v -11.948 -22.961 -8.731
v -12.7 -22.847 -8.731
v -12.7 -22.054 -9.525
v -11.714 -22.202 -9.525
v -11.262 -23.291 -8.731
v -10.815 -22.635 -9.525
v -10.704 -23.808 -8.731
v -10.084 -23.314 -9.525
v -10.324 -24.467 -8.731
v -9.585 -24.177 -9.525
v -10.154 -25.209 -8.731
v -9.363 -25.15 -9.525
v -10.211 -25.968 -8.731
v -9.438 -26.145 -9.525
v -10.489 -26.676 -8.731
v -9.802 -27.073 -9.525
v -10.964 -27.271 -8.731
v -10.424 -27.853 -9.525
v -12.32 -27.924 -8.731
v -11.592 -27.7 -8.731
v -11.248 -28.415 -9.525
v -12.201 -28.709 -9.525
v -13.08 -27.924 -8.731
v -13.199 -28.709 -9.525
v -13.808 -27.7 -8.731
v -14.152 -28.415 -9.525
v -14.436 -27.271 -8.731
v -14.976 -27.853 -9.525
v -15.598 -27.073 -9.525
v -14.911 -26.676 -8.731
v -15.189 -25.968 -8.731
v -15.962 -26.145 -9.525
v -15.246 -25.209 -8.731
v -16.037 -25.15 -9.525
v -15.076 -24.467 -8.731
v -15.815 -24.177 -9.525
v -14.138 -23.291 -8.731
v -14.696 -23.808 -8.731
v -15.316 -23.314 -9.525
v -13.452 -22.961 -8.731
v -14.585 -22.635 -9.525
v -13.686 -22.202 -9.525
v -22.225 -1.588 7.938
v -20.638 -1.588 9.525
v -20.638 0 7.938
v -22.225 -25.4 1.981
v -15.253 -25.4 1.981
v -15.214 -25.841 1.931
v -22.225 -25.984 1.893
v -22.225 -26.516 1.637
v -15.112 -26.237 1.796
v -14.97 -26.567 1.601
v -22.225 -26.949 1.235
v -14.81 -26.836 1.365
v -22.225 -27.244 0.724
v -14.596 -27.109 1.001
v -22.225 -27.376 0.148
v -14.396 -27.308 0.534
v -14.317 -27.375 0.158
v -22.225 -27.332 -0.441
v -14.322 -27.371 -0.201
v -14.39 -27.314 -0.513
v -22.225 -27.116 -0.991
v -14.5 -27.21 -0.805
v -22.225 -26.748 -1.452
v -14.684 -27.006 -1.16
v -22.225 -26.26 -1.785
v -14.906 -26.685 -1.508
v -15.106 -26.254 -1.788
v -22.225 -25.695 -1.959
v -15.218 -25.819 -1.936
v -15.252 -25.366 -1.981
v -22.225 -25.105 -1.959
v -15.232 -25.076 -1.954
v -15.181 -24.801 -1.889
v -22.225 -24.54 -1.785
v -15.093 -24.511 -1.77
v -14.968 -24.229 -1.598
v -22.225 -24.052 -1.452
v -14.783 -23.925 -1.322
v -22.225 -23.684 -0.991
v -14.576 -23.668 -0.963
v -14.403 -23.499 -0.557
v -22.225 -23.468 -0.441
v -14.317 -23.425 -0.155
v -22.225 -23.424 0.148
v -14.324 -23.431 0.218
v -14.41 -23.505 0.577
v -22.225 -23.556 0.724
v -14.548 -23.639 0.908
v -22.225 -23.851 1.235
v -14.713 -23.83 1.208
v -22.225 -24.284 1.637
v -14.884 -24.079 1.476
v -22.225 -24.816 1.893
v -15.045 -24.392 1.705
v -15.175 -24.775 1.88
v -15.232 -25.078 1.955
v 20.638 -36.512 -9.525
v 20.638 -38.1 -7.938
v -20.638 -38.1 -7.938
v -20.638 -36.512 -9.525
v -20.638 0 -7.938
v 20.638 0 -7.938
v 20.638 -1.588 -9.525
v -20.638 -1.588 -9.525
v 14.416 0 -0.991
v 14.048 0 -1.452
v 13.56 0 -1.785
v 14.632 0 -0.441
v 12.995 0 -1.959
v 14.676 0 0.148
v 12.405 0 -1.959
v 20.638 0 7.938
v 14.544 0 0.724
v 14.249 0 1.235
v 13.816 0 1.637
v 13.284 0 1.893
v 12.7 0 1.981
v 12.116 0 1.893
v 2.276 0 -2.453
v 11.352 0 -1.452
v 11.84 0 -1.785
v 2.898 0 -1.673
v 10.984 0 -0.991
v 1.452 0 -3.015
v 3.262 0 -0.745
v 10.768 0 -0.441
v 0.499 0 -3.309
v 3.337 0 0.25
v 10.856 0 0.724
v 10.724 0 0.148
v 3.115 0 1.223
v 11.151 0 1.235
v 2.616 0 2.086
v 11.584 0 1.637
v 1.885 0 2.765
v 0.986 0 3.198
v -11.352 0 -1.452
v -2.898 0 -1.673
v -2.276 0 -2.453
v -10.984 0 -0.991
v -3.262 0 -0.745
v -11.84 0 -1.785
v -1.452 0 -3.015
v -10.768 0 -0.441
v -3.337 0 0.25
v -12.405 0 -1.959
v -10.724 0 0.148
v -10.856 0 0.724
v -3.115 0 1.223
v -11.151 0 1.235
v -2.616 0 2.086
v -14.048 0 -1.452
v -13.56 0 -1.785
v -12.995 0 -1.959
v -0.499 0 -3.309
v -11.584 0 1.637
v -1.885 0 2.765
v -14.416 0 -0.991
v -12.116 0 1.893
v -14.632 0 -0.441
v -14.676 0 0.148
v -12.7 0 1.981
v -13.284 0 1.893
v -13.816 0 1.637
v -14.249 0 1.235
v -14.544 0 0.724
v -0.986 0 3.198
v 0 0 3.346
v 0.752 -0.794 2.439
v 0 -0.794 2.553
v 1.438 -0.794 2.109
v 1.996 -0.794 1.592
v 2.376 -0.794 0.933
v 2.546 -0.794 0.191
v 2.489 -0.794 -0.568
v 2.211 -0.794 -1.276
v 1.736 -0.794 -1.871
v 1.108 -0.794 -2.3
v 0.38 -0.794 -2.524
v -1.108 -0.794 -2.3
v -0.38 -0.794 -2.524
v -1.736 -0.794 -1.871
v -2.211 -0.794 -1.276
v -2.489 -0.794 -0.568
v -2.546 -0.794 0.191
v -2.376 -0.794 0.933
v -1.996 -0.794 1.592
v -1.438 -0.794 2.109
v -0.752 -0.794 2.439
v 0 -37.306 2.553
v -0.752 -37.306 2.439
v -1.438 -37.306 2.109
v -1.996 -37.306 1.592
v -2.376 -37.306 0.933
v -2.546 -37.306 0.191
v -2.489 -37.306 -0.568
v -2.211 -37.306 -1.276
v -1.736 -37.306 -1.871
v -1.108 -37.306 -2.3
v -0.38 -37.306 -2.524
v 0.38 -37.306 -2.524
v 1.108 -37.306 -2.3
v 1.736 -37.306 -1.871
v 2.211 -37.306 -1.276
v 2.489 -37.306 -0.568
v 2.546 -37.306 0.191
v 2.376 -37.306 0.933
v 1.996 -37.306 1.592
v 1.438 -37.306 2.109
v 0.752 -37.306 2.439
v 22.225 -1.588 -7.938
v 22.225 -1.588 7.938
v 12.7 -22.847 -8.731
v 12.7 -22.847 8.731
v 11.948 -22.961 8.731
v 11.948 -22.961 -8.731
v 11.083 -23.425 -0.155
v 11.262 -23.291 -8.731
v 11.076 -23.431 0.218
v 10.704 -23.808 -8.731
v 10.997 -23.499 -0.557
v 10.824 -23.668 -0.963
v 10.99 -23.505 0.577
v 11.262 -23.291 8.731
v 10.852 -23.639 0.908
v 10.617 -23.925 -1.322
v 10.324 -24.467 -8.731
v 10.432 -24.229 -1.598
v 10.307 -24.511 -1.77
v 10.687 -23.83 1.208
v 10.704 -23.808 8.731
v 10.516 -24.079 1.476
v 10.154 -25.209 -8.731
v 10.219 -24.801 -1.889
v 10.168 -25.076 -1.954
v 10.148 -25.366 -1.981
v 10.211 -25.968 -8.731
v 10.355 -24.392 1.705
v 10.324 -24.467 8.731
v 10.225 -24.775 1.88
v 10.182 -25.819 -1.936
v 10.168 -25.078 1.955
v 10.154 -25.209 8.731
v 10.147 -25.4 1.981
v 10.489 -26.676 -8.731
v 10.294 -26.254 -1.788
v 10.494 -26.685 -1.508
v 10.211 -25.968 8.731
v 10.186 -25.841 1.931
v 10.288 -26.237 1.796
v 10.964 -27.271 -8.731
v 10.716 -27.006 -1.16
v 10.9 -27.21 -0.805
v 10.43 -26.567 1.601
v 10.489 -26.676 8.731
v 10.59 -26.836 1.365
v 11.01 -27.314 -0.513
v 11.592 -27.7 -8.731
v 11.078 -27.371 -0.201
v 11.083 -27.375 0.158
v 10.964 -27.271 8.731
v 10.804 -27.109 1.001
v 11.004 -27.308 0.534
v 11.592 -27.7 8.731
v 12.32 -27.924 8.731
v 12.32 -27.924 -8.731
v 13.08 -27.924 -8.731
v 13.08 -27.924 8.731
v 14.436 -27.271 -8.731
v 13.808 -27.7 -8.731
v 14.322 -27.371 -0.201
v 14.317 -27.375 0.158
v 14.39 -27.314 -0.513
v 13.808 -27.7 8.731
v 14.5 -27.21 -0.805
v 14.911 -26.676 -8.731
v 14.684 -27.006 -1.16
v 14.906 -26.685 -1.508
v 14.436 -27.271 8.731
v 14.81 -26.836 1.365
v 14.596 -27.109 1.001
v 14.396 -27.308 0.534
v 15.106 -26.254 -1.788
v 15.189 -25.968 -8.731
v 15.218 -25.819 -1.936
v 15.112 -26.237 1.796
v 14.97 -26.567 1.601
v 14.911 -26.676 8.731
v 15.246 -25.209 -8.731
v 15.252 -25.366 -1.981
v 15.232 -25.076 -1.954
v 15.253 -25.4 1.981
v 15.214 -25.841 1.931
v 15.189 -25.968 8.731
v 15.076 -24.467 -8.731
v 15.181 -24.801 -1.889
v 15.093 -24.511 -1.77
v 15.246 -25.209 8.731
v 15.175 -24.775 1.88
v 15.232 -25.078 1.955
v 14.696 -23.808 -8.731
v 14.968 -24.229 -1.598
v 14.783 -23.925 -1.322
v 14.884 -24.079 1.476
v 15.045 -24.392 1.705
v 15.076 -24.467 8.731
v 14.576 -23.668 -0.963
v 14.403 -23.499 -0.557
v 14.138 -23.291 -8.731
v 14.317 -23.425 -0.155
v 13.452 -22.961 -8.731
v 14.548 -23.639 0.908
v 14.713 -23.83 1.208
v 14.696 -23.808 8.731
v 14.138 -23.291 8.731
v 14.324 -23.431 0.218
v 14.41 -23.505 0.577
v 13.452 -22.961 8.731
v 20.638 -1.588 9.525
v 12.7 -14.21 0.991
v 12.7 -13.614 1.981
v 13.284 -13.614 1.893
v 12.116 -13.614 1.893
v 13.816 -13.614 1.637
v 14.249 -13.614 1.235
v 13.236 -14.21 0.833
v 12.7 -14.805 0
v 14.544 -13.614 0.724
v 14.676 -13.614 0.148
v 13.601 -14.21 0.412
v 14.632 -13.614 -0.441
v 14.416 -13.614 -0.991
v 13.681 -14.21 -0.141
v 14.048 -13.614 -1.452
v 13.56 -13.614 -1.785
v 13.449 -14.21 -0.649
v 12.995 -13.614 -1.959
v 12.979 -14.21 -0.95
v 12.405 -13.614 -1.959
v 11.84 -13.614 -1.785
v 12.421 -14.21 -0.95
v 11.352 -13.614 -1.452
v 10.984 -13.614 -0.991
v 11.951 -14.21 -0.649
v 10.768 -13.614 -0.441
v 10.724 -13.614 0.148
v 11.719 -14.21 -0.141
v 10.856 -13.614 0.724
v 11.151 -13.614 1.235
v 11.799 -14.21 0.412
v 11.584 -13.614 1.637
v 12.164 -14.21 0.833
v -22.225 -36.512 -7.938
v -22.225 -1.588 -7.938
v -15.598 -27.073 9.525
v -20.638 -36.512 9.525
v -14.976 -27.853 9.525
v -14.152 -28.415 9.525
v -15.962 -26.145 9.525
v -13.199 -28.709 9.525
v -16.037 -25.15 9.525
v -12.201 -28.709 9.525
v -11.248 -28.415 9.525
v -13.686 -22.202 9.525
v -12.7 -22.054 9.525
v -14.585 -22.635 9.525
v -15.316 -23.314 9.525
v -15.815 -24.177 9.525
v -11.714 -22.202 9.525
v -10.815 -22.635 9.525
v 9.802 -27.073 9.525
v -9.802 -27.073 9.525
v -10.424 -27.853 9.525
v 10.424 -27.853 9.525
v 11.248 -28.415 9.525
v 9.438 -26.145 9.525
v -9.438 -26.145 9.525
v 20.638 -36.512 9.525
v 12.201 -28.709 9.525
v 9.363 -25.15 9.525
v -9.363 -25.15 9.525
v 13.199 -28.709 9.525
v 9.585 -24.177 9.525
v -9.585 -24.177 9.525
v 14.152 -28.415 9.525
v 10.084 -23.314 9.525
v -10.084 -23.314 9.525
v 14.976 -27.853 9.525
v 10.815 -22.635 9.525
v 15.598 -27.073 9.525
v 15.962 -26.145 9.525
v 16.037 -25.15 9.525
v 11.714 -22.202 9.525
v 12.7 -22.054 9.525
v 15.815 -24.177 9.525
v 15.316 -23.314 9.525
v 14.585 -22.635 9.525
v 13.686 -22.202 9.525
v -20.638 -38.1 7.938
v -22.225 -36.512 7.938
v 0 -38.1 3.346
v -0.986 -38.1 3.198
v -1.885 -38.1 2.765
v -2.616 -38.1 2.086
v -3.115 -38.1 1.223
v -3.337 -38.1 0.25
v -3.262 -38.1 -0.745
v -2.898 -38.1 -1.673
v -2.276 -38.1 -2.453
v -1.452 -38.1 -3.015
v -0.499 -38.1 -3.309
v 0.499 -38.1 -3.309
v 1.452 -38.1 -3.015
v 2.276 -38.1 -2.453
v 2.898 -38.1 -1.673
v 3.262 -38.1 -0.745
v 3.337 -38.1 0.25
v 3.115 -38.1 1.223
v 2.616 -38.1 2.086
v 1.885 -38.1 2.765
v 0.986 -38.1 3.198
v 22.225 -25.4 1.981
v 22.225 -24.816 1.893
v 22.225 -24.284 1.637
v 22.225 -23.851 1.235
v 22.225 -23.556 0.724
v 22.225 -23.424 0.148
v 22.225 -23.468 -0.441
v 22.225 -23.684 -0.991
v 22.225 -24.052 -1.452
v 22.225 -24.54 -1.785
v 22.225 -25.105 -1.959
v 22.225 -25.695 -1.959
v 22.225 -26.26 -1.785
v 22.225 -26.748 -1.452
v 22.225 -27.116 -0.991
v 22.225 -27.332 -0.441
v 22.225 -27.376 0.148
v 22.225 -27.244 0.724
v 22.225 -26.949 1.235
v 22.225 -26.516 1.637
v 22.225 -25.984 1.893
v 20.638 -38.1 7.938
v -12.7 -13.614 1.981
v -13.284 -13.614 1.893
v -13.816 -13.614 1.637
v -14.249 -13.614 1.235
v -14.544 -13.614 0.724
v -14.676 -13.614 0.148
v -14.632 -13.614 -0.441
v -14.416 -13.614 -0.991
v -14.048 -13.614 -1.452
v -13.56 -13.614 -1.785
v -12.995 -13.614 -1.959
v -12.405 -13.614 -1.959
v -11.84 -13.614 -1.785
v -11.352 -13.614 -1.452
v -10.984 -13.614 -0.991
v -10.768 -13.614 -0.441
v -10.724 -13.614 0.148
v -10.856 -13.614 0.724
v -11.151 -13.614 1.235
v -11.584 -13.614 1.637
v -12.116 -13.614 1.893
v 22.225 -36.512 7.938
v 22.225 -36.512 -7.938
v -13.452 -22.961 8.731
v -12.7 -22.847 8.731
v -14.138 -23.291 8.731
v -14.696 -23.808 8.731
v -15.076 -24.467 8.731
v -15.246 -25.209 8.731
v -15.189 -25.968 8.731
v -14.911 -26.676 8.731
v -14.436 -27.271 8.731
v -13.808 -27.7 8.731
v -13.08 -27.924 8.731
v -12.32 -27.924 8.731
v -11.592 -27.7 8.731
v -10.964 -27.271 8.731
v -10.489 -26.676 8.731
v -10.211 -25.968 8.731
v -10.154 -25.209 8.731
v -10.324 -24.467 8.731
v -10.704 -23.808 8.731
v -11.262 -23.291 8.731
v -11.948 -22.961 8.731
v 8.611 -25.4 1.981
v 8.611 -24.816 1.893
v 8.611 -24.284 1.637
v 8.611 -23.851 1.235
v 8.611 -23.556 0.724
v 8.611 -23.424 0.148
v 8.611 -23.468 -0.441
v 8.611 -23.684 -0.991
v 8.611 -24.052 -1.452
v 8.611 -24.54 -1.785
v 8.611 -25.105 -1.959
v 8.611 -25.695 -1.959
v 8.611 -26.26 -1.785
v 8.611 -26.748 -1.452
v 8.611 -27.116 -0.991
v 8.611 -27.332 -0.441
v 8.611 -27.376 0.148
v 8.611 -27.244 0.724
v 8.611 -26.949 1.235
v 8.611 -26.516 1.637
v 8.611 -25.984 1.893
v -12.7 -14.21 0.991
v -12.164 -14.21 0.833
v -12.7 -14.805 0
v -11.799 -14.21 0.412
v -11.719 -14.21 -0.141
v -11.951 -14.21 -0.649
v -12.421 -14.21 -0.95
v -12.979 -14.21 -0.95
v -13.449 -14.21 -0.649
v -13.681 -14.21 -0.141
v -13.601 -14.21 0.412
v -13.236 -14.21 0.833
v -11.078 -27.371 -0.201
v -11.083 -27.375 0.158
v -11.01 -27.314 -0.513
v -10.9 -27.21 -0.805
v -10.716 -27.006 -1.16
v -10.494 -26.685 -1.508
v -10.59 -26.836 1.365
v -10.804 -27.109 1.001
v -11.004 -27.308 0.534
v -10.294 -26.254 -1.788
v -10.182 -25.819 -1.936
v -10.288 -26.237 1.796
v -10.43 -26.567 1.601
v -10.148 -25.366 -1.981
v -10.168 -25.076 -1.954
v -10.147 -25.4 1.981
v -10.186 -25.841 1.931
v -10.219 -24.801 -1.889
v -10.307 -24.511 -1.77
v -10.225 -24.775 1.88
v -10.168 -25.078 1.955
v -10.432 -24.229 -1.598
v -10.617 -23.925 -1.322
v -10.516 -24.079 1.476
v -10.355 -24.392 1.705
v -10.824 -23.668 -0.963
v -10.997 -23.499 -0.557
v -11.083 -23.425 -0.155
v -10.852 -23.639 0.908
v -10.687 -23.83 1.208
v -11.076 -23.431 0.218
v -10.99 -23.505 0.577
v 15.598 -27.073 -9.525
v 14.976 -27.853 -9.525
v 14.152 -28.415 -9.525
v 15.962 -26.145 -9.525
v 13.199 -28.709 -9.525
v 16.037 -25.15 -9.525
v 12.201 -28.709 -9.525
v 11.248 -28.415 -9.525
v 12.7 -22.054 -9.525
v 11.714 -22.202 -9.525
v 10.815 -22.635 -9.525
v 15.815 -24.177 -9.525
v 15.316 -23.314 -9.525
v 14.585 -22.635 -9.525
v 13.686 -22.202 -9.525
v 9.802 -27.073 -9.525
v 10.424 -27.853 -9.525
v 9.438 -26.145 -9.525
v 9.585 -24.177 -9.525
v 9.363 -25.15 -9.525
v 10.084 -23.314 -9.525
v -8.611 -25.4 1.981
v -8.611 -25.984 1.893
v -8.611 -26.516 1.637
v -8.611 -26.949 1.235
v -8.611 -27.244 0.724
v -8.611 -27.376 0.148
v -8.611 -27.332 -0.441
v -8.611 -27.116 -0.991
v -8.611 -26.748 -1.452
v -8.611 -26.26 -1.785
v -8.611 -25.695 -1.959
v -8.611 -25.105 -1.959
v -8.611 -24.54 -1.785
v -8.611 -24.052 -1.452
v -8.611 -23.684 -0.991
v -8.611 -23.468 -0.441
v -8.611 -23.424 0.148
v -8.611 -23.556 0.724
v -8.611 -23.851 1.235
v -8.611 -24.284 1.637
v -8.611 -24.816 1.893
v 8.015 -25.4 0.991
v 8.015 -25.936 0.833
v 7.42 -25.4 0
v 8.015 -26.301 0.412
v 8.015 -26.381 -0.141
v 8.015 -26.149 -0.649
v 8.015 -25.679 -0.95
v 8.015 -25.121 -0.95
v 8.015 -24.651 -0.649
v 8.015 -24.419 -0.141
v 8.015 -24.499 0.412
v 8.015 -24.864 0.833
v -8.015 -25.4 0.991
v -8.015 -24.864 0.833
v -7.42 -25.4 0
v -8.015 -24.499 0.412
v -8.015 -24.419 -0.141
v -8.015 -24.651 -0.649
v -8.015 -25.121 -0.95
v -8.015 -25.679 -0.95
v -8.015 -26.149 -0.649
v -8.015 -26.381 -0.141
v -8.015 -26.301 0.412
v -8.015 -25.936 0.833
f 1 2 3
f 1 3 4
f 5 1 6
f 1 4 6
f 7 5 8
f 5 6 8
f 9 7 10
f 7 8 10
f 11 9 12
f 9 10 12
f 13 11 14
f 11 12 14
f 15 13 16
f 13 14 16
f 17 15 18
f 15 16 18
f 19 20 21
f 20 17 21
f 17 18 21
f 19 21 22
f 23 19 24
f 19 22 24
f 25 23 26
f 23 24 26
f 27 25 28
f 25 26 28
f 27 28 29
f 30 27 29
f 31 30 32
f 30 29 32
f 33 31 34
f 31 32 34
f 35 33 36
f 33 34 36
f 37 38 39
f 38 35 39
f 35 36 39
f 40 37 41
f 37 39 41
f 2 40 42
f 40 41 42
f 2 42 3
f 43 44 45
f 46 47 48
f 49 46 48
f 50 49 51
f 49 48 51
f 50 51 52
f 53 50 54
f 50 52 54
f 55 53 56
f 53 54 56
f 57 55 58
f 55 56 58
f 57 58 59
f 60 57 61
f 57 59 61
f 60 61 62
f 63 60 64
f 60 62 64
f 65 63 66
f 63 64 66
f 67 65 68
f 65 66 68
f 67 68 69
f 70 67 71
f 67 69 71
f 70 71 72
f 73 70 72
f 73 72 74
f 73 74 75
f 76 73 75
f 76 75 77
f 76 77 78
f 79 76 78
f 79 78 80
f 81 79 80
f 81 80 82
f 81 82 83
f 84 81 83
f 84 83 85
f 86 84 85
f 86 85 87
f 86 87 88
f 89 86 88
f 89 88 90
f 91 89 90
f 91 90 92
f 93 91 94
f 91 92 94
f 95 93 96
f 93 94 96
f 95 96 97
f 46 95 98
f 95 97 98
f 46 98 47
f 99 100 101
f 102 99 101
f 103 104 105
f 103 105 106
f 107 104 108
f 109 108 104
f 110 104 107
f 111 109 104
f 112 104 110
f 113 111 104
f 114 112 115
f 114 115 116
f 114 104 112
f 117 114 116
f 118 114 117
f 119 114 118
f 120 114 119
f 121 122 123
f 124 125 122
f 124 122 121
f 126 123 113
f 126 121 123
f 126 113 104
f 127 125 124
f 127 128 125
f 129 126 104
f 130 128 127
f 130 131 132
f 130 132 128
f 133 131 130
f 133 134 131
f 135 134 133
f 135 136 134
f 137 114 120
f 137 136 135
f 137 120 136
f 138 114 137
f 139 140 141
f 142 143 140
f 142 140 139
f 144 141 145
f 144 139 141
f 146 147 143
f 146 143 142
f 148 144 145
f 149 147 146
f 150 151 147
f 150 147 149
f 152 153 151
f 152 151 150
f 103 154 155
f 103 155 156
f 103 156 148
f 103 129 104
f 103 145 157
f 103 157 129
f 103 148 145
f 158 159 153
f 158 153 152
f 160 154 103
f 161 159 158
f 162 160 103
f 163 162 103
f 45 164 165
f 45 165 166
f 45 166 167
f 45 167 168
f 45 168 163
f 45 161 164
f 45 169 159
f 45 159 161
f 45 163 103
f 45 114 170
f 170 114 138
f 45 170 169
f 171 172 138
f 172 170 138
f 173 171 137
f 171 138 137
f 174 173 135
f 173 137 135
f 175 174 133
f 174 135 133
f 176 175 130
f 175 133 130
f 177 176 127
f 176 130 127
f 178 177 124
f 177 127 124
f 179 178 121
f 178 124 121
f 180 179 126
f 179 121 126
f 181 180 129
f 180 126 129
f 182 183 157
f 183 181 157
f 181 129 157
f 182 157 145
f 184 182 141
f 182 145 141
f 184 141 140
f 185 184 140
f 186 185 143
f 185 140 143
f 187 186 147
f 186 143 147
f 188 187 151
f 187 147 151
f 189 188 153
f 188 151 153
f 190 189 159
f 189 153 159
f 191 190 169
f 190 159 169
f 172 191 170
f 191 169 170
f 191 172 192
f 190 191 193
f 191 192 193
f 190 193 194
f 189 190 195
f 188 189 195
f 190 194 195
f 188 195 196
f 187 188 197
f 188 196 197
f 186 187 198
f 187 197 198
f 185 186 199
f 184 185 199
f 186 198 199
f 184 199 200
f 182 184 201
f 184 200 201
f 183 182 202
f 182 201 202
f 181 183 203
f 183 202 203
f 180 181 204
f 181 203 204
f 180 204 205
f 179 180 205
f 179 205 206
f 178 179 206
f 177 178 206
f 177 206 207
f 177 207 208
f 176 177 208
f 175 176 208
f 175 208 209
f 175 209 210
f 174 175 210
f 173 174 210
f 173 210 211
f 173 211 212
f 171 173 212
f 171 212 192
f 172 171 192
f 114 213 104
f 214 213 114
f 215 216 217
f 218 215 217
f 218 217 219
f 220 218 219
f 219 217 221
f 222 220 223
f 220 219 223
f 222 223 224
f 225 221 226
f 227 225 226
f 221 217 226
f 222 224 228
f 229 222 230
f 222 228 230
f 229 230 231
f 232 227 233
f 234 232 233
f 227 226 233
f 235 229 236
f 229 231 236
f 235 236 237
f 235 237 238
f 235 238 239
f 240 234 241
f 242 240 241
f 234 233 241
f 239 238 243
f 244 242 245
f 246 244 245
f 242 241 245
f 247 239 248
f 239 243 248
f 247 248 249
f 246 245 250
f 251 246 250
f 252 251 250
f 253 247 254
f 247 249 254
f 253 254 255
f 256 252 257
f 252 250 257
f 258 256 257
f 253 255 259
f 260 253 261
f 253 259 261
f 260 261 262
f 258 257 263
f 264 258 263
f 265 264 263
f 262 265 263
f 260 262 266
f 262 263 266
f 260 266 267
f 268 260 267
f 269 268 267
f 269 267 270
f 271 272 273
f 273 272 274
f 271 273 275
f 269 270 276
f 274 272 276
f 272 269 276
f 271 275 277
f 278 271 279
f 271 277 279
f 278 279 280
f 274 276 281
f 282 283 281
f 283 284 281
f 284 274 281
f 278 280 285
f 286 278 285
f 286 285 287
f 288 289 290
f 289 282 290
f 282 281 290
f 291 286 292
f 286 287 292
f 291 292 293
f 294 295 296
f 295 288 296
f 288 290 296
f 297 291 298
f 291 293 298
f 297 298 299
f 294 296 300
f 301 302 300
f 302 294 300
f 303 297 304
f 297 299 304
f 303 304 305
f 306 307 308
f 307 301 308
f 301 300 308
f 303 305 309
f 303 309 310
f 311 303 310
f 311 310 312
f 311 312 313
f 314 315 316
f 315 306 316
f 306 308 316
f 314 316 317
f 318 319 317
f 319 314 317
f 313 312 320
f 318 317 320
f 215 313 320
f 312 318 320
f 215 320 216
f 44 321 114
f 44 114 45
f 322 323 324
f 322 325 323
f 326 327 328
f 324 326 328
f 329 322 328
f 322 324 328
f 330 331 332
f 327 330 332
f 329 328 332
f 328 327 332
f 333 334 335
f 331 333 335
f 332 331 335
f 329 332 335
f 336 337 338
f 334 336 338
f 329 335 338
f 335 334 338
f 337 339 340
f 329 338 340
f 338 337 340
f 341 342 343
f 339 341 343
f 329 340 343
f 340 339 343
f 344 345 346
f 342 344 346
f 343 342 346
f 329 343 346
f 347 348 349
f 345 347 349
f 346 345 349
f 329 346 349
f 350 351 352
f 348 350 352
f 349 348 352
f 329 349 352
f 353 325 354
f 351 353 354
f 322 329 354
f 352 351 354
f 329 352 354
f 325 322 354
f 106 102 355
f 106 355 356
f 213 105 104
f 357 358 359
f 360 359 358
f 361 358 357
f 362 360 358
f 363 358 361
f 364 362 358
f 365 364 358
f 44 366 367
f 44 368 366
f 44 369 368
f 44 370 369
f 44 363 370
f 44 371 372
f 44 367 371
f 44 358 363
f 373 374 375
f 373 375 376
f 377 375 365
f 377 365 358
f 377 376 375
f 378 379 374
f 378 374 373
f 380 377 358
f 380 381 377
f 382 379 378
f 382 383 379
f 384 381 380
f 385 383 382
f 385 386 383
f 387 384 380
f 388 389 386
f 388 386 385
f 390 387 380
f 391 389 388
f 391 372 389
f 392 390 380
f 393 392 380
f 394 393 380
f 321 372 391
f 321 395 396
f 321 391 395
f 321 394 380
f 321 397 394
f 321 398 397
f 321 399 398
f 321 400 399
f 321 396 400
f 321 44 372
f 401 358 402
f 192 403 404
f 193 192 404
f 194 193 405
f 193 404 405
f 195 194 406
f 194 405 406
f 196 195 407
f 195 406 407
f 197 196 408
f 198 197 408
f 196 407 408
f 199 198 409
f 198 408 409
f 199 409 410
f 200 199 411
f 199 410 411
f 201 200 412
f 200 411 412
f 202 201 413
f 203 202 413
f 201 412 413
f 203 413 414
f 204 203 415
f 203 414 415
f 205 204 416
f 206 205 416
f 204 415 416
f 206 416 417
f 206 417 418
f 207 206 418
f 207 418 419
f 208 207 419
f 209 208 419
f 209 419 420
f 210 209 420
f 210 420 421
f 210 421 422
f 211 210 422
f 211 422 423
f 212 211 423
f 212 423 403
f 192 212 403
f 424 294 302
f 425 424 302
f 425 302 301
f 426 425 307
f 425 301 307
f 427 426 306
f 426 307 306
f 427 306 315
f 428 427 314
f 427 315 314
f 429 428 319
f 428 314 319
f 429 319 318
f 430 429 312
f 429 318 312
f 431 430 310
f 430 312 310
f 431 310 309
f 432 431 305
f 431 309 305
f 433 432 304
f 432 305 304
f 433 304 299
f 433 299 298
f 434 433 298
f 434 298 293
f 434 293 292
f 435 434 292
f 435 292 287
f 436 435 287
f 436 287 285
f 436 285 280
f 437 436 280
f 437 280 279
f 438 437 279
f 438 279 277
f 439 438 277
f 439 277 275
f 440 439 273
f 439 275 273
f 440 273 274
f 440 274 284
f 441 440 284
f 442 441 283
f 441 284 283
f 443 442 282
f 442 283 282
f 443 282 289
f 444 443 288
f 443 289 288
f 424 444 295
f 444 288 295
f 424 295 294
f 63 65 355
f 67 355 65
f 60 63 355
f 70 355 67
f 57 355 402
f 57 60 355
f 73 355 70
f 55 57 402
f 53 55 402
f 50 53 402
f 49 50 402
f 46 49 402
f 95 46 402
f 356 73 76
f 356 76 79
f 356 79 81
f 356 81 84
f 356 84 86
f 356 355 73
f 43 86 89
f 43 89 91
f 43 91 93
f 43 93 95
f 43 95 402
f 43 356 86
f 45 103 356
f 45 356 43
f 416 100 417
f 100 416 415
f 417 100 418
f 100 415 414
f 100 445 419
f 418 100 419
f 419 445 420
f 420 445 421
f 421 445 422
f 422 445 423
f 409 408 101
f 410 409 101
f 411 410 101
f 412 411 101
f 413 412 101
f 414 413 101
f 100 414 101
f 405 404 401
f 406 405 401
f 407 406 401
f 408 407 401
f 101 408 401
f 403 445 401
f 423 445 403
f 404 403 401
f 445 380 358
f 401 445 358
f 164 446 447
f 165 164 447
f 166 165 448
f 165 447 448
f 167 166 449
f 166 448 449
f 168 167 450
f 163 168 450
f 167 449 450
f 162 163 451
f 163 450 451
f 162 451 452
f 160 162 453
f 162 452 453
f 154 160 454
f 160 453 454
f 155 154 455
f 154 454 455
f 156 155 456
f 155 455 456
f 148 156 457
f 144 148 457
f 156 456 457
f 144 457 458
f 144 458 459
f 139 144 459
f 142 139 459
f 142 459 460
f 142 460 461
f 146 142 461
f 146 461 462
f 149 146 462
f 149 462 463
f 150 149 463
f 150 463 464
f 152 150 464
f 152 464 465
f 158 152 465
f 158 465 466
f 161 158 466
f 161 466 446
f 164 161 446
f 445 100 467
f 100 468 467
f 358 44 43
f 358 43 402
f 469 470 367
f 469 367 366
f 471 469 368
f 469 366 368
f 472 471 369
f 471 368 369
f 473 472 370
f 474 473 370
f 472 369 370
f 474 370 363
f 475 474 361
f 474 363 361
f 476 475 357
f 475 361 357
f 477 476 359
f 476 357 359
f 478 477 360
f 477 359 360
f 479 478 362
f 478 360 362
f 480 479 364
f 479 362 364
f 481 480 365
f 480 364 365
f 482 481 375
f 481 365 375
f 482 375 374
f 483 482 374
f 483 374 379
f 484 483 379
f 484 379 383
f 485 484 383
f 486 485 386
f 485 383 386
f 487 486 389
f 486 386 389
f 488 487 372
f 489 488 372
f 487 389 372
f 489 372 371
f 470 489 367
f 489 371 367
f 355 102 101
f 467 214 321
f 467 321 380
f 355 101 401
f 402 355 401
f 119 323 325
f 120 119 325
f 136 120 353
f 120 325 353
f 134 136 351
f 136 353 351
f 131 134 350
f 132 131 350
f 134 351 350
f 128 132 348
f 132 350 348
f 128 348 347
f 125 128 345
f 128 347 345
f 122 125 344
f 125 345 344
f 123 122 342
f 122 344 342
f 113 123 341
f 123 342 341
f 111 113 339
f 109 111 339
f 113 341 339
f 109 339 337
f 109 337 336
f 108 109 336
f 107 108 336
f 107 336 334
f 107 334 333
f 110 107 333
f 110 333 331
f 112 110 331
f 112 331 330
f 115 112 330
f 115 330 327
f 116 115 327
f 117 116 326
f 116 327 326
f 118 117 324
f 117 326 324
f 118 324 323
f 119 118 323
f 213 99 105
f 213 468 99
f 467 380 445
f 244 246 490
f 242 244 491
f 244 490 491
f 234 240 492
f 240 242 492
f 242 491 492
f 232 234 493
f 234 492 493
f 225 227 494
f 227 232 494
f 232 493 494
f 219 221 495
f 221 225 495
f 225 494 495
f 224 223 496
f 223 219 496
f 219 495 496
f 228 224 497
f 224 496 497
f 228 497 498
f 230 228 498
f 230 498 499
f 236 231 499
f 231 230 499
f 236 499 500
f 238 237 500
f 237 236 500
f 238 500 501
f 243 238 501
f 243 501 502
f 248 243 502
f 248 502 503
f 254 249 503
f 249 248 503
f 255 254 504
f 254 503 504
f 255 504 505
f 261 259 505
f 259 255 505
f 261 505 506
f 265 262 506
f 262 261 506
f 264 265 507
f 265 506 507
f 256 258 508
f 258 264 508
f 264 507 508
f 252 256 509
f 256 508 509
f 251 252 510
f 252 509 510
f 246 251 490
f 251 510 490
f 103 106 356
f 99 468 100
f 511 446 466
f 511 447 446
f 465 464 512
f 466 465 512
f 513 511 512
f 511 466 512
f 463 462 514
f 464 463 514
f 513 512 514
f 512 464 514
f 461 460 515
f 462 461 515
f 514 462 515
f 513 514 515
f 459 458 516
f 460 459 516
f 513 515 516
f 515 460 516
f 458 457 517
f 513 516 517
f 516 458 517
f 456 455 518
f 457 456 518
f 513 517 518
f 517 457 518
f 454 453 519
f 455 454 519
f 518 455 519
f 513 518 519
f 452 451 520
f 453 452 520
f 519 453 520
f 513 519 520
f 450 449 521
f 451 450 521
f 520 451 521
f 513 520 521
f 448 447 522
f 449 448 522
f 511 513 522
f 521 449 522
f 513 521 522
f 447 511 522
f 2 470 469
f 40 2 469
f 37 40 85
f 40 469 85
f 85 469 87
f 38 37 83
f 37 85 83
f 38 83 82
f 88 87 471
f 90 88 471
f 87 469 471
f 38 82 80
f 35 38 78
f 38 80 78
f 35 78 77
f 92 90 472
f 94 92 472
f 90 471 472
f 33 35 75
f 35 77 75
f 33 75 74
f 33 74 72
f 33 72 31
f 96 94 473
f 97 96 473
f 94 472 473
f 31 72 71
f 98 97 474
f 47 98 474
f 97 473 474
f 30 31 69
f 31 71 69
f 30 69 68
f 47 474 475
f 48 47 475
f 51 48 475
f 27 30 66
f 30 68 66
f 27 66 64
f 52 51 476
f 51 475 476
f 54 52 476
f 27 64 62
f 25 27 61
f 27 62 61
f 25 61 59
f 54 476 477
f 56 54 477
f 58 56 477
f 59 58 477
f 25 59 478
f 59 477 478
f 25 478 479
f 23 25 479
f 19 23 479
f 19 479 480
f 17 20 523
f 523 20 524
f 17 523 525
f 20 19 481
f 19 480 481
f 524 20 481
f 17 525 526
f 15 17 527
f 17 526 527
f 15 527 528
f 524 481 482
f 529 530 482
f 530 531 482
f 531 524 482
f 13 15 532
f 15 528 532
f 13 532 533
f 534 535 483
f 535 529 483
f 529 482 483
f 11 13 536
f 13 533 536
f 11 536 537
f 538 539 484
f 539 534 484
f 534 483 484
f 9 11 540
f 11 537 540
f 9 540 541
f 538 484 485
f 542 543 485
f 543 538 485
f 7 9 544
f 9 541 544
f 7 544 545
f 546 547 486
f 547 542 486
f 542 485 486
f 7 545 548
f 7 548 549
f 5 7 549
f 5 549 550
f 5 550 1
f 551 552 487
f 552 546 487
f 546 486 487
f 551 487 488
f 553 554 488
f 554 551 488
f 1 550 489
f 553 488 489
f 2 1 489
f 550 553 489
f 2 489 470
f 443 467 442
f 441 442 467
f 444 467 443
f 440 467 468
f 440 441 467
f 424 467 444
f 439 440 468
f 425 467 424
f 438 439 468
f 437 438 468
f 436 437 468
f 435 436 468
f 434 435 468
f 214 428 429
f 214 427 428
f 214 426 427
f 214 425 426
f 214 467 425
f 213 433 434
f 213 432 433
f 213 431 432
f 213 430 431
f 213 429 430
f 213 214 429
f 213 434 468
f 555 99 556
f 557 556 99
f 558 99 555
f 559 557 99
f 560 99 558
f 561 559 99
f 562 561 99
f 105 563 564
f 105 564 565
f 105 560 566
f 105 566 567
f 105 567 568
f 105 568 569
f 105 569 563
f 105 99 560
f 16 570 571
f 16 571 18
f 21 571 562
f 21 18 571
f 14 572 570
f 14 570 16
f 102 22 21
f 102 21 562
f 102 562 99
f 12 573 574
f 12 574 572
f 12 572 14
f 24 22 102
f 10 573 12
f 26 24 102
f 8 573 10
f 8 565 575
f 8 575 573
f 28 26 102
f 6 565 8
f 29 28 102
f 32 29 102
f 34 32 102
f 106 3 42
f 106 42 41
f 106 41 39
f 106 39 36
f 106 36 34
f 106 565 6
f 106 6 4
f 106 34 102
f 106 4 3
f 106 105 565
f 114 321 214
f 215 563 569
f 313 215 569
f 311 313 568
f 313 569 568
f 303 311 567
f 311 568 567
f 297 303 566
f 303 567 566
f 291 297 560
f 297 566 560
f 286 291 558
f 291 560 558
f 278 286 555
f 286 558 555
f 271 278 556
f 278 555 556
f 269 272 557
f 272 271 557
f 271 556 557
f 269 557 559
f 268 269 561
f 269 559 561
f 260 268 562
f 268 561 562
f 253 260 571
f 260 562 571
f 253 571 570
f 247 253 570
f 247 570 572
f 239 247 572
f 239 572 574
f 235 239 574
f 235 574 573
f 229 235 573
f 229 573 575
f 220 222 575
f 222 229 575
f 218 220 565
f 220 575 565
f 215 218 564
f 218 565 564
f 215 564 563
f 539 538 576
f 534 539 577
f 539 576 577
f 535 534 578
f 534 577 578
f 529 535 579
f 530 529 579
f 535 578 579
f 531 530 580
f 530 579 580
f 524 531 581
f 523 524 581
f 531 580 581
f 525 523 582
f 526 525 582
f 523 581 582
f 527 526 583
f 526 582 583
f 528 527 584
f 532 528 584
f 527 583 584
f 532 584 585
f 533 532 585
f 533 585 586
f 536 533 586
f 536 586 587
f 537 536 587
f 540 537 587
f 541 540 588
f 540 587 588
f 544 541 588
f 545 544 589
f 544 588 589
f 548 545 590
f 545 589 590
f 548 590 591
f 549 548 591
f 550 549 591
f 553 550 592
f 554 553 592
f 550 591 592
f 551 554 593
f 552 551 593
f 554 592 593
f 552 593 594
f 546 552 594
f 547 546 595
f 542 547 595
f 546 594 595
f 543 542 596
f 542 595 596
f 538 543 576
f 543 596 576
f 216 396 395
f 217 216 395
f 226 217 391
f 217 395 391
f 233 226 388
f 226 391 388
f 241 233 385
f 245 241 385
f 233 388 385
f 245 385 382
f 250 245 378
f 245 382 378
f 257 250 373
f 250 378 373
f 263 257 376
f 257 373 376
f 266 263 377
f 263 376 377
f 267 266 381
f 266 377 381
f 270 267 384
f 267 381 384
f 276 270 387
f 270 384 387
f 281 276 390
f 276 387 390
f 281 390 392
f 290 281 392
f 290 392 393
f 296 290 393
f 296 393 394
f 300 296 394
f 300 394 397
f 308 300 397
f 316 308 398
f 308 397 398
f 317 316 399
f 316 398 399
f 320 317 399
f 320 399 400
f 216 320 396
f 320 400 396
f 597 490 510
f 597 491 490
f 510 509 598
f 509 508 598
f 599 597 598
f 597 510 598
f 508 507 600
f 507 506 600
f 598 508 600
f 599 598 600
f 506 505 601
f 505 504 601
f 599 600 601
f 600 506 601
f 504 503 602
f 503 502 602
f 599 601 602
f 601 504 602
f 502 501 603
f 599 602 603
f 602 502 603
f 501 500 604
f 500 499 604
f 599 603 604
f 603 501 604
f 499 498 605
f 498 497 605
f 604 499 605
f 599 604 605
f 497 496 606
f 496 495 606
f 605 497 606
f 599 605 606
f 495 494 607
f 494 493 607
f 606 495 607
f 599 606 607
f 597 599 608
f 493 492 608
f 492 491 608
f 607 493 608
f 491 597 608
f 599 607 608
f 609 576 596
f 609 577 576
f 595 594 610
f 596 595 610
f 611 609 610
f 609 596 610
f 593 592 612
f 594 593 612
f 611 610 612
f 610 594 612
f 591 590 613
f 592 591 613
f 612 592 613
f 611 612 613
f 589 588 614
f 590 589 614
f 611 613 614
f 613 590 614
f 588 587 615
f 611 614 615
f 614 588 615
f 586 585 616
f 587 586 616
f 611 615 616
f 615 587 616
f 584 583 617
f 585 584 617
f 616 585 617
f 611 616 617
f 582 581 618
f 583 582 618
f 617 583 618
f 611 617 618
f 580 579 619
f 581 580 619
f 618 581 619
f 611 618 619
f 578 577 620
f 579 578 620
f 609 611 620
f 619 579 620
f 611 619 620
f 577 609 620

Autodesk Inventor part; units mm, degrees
ref_plane "YZ Plane" through (0, 0, 0) normal (1, 0, 0) x (0, 1, 0)
ref_plane "XY Plane" through (0, 0, 0) normal (0, 0, 1) x (1, 0, 0)
sketch "Sketch2" plane through (0, 0, 0) normal (0, 1, 0) x (-1, 0, 0)
  line L0 (0, -13.335) -> (0, 13.335) construction
  line L1 (-31.115, 0) -> (31.115, 0) construction
  line L2 (22.225, 9.525) -> (-22.225, 9.525)
  line L3 (-22.225, 9.525) -> (-22.225, -9.525)
  line L4 (-22.225, -9.525) -> (22.225, -9.525)
  line L5 (22.225, -9.525) -> (22.225, 9.525)
  point P0 (0, 0)
  point P1 (0, 0)
  point P2 (-12.7, 0)
  point P3 (12.7, 0)
  dimension "d0" = 19.05
  dimension "d1" = 44.45
  dimension "d5" = 25.4
extrude "Extrusion1" add sketch "Sketch2" against normal blind 38.1
hole "Hole1" at (0, 0, 0) direction (0, -1, 0) diameter 5.1054 end through all
hole "Hole2" at (12.7, 0, 0) at (-12.7, 0, 0) direction (0, -1, 0) diameter 3.9624 depth 13.6144 tip angle 118 thread size "10-32 UNF" class "2B" standard "ANSI Unified Screw Threads"
ref_plane "Work Plane1" through (0, -25.4, 0) normal (0, 1, 0) x (-1, 0, 0)
sketch "Sketch3" plane through (22.225, 0, -9.525) normal (0, 0, -1) x (-1, 0, 0)
  line L0 (22.225, -45.72) -> (22.225, 7.62) construction
  line L1 (-8.89, -25.4) -> (53.34, -25.4) construction
  line L2 (-8.89, 0) -> (53.34, 0) construction
  point P0 (22.225, 0)
  point P1 (34.925, -25.4)
  point P2 (9.525, -25.4)
  dimension "d21" = 25.4
hole "Hole3" at (-12.7, -25.4, -9.525) at (12.7, -25.4, -9.525) direction (0, 0, 1) diameter 5.1054 end through all clearance for "Socket Head Cap Screw" size "#10" standard "Ansi Unified Screw Threads"
sketch "Sketch4" plane through (0, -25.4, 0) normal (0, 1, 0) x (-1, 0, 0)
  point P0 (0, 0)
sketch "Sketch5" plane through (-22.225, 0, -9.525) normal (-1, 0, 0) x (0, 0, 1)
  line L0 (9.525, 7.62) -> (9.525, -45.72) construction
  line L1 (-3.81, 0) -> (22.86, 0) construction
  line L2 (-3.81, -25.4) -> (22.86, -25.4) construction
  point P0 (9.525, 0)
  point P1 (9.525, -25.4)
hole "Hole4" at (-22.225, -25.4, 0) direction (1, 0, 0) diameter 3.9624 depth 13.6144 tip angle 118 thread size "10-32 UNF" class "2B" standard "ANSI Unified Screw Threads"
mirror "Mirror1" about plane through (0, 0, 0) normal (1, 0, 0) of "Hole4"
chamfer "Chamfer1" distance 1.5875 angle 45 12 edges at (-22.225, -19.05, -9.525) (22.225, -19.05, -9.525) (-22.225, -19.05, 9.525) (22.225, -19.05, 9.525) (0, 0, 9.525) (0, 0, -9.525) (-22.225, 0, 0) (22.225, 0, 0) (0, -38.1, 9.525) (22.225, -38.1, 0) (0, -38.1, -9.525) (-22.225, -38.1, 0)
chamfer "Chamfer2" distance 0.7937 angle 45 6 edges at (-12.7, -27.9527, 9.525) (12.7, -27.9527, 9.525) (12.7, -27.9527, -9.525) (-12.7, -27.9527, -9.525) (0, 0, -2.5527) (0, -38.1, -2.5527)
equation "\"d21\" = d5"
properties part number "5190-16-0001" material "Aluminum 6061"
